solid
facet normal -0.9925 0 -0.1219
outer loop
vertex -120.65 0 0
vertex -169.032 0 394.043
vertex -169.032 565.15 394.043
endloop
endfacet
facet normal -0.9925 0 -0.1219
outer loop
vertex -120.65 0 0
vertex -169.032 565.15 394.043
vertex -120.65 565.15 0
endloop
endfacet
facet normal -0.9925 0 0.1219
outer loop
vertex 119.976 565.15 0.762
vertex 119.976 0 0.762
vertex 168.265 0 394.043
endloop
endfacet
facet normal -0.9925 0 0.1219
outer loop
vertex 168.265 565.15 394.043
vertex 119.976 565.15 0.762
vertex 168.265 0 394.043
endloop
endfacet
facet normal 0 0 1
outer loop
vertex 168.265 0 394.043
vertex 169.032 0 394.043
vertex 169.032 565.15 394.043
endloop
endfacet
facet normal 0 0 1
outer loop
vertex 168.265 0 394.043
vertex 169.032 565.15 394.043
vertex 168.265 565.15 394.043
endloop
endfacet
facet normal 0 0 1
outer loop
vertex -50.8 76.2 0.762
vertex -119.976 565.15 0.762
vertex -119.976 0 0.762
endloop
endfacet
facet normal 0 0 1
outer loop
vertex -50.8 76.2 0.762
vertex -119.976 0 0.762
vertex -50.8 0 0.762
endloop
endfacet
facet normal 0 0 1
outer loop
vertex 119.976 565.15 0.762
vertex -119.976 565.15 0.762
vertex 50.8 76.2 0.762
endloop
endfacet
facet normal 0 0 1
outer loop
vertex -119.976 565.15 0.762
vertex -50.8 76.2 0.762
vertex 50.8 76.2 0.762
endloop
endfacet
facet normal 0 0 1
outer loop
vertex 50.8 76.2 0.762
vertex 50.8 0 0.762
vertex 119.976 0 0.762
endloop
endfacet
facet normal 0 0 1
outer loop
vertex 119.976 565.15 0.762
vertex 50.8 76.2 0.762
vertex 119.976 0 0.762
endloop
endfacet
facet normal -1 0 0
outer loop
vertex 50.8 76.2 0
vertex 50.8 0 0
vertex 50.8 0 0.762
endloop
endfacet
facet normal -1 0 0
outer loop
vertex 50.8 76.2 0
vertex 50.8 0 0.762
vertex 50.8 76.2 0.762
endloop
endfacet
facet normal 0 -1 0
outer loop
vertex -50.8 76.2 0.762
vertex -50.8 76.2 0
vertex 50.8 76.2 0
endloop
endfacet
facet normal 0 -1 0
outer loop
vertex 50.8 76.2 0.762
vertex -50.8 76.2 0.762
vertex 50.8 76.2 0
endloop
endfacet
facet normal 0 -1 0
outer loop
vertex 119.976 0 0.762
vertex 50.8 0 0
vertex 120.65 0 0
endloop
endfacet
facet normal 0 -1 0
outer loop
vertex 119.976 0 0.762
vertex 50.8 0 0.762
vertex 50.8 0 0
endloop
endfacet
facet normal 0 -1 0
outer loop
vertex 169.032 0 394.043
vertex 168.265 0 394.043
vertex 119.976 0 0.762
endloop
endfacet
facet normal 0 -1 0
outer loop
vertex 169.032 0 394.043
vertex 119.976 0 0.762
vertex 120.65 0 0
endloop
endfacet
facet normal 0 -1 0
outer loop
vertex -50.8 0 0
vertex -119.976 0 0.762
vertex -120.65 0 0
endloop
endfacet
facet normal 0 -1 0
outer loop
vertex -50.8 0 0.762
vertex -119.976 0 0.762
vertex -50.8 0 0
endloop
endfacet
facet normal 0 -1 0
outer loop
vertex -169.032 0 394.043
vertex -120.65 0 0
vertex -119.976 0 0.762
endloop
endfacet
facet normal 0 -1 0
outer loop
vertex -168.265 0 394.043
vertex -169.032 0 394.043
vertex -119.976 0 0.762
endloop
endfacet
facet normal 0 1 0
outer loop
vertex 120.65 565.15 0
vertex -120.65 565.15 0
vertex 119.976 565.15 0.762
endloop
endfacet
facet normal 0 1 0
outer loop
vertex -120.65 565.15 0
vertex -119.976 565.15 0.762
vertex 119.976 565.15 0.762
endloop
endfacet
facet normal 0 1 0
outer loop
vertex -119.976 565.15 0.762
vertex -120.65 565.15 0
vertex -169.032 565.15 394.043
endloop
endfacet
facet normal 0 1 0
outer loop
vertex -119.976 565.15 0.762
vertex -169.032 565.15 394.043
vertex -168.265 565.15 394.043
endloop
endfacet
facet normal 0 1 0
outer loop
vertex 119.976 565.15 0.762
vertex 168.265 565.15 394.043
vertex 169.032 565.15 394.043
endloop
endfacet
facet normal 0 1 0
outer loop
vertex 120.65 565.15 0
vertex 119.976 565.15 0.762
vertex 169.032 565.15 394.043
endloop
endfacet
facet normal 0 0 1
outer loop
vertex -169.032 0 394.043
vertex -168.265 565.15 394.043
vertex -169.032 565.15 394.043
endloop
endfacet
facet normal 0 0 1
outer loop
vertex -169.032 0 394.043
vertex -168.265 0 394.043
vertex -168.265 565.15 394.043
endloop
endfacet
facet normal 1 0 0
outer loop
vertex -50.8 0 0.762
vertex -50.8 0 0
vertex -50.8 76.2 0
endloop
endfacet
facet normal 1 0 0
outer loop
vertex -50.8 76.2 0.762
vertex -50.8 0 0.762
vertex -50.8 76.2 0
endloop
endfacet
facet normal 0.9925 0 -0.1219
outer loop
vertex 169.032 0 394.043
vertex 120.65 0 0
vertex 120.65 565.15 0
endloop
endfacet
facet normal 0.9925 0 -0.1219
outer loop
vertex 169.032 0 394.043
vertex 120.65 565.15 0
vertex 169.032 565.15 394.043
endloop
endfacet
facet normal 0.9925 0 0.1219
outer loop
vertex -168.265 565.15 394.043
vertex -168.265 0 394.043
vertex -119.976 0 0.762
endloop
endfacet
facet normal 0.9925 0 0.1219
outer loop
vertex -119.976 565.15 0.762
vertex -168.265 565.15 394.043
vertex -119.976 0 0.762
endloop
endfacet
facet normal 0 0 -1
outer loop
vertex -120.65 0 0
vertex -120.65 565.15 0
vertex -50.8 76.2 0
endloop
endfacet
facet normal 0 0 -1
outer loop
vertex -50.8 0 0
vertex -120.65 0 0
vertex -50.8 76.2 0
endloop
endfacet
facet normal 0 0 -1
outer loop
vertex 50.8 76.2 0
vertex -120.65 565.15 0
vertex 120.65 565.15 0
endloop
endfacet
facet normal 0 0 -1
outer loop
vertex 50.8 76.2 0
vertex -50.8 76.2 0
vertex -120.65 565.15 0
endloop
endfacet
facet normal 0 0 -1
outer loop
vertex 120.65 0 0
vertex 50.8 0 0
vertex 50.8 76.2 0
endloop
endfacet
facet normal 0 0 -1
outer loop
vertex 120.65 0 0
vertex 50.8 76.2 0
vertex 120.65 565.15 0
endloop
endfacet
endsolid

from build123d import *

# Parameters (mm, degrees)
F1_DEPTH      = 565.15
F2_T          = -0.762
F3_W          = 101.6
F3_H          = 76.2
F4_DEPTH      = 81.28
F4_DEPTH_BACK = 106.68


with BuildPart() as f1:
    # F0 (on Front) → F1 (new body)
    with BuildSketch(Plane.XZ):
        Polygon((-120.65, 0), (0, 0), (120.65, 0), (169.0323730705, 394.0428072939), (-169.0323730705, 394.0428072939), align=None)
    extrude(amount=-F1_DEPTH)

    # F2
    f2_openings = [f1.faces().sort_by_distance(p)[0] for p in [
        (0, 0, 207.990156),
        (0, 282.575, 394.042807),
        (0, 565.15, 207.990156),
    ]]
    offset(amount=F2_T, openings=f2_openings)

    # F3 (on Top) → F4 (cut, two sides)
    with BuildSketch(Plane.XY) as f4_sk:
        with Locations((0, 38.1)):
            Rectangle(F3_W, F3_H)
    extrude(amount=-F4_DEPTH, mode=Mode.SUBTRACT)
    extrude(f4_sk.sketch, amount=F4_DEPTH_BACK, mode=Mode.SUBTRACT)


solid = f1.part
